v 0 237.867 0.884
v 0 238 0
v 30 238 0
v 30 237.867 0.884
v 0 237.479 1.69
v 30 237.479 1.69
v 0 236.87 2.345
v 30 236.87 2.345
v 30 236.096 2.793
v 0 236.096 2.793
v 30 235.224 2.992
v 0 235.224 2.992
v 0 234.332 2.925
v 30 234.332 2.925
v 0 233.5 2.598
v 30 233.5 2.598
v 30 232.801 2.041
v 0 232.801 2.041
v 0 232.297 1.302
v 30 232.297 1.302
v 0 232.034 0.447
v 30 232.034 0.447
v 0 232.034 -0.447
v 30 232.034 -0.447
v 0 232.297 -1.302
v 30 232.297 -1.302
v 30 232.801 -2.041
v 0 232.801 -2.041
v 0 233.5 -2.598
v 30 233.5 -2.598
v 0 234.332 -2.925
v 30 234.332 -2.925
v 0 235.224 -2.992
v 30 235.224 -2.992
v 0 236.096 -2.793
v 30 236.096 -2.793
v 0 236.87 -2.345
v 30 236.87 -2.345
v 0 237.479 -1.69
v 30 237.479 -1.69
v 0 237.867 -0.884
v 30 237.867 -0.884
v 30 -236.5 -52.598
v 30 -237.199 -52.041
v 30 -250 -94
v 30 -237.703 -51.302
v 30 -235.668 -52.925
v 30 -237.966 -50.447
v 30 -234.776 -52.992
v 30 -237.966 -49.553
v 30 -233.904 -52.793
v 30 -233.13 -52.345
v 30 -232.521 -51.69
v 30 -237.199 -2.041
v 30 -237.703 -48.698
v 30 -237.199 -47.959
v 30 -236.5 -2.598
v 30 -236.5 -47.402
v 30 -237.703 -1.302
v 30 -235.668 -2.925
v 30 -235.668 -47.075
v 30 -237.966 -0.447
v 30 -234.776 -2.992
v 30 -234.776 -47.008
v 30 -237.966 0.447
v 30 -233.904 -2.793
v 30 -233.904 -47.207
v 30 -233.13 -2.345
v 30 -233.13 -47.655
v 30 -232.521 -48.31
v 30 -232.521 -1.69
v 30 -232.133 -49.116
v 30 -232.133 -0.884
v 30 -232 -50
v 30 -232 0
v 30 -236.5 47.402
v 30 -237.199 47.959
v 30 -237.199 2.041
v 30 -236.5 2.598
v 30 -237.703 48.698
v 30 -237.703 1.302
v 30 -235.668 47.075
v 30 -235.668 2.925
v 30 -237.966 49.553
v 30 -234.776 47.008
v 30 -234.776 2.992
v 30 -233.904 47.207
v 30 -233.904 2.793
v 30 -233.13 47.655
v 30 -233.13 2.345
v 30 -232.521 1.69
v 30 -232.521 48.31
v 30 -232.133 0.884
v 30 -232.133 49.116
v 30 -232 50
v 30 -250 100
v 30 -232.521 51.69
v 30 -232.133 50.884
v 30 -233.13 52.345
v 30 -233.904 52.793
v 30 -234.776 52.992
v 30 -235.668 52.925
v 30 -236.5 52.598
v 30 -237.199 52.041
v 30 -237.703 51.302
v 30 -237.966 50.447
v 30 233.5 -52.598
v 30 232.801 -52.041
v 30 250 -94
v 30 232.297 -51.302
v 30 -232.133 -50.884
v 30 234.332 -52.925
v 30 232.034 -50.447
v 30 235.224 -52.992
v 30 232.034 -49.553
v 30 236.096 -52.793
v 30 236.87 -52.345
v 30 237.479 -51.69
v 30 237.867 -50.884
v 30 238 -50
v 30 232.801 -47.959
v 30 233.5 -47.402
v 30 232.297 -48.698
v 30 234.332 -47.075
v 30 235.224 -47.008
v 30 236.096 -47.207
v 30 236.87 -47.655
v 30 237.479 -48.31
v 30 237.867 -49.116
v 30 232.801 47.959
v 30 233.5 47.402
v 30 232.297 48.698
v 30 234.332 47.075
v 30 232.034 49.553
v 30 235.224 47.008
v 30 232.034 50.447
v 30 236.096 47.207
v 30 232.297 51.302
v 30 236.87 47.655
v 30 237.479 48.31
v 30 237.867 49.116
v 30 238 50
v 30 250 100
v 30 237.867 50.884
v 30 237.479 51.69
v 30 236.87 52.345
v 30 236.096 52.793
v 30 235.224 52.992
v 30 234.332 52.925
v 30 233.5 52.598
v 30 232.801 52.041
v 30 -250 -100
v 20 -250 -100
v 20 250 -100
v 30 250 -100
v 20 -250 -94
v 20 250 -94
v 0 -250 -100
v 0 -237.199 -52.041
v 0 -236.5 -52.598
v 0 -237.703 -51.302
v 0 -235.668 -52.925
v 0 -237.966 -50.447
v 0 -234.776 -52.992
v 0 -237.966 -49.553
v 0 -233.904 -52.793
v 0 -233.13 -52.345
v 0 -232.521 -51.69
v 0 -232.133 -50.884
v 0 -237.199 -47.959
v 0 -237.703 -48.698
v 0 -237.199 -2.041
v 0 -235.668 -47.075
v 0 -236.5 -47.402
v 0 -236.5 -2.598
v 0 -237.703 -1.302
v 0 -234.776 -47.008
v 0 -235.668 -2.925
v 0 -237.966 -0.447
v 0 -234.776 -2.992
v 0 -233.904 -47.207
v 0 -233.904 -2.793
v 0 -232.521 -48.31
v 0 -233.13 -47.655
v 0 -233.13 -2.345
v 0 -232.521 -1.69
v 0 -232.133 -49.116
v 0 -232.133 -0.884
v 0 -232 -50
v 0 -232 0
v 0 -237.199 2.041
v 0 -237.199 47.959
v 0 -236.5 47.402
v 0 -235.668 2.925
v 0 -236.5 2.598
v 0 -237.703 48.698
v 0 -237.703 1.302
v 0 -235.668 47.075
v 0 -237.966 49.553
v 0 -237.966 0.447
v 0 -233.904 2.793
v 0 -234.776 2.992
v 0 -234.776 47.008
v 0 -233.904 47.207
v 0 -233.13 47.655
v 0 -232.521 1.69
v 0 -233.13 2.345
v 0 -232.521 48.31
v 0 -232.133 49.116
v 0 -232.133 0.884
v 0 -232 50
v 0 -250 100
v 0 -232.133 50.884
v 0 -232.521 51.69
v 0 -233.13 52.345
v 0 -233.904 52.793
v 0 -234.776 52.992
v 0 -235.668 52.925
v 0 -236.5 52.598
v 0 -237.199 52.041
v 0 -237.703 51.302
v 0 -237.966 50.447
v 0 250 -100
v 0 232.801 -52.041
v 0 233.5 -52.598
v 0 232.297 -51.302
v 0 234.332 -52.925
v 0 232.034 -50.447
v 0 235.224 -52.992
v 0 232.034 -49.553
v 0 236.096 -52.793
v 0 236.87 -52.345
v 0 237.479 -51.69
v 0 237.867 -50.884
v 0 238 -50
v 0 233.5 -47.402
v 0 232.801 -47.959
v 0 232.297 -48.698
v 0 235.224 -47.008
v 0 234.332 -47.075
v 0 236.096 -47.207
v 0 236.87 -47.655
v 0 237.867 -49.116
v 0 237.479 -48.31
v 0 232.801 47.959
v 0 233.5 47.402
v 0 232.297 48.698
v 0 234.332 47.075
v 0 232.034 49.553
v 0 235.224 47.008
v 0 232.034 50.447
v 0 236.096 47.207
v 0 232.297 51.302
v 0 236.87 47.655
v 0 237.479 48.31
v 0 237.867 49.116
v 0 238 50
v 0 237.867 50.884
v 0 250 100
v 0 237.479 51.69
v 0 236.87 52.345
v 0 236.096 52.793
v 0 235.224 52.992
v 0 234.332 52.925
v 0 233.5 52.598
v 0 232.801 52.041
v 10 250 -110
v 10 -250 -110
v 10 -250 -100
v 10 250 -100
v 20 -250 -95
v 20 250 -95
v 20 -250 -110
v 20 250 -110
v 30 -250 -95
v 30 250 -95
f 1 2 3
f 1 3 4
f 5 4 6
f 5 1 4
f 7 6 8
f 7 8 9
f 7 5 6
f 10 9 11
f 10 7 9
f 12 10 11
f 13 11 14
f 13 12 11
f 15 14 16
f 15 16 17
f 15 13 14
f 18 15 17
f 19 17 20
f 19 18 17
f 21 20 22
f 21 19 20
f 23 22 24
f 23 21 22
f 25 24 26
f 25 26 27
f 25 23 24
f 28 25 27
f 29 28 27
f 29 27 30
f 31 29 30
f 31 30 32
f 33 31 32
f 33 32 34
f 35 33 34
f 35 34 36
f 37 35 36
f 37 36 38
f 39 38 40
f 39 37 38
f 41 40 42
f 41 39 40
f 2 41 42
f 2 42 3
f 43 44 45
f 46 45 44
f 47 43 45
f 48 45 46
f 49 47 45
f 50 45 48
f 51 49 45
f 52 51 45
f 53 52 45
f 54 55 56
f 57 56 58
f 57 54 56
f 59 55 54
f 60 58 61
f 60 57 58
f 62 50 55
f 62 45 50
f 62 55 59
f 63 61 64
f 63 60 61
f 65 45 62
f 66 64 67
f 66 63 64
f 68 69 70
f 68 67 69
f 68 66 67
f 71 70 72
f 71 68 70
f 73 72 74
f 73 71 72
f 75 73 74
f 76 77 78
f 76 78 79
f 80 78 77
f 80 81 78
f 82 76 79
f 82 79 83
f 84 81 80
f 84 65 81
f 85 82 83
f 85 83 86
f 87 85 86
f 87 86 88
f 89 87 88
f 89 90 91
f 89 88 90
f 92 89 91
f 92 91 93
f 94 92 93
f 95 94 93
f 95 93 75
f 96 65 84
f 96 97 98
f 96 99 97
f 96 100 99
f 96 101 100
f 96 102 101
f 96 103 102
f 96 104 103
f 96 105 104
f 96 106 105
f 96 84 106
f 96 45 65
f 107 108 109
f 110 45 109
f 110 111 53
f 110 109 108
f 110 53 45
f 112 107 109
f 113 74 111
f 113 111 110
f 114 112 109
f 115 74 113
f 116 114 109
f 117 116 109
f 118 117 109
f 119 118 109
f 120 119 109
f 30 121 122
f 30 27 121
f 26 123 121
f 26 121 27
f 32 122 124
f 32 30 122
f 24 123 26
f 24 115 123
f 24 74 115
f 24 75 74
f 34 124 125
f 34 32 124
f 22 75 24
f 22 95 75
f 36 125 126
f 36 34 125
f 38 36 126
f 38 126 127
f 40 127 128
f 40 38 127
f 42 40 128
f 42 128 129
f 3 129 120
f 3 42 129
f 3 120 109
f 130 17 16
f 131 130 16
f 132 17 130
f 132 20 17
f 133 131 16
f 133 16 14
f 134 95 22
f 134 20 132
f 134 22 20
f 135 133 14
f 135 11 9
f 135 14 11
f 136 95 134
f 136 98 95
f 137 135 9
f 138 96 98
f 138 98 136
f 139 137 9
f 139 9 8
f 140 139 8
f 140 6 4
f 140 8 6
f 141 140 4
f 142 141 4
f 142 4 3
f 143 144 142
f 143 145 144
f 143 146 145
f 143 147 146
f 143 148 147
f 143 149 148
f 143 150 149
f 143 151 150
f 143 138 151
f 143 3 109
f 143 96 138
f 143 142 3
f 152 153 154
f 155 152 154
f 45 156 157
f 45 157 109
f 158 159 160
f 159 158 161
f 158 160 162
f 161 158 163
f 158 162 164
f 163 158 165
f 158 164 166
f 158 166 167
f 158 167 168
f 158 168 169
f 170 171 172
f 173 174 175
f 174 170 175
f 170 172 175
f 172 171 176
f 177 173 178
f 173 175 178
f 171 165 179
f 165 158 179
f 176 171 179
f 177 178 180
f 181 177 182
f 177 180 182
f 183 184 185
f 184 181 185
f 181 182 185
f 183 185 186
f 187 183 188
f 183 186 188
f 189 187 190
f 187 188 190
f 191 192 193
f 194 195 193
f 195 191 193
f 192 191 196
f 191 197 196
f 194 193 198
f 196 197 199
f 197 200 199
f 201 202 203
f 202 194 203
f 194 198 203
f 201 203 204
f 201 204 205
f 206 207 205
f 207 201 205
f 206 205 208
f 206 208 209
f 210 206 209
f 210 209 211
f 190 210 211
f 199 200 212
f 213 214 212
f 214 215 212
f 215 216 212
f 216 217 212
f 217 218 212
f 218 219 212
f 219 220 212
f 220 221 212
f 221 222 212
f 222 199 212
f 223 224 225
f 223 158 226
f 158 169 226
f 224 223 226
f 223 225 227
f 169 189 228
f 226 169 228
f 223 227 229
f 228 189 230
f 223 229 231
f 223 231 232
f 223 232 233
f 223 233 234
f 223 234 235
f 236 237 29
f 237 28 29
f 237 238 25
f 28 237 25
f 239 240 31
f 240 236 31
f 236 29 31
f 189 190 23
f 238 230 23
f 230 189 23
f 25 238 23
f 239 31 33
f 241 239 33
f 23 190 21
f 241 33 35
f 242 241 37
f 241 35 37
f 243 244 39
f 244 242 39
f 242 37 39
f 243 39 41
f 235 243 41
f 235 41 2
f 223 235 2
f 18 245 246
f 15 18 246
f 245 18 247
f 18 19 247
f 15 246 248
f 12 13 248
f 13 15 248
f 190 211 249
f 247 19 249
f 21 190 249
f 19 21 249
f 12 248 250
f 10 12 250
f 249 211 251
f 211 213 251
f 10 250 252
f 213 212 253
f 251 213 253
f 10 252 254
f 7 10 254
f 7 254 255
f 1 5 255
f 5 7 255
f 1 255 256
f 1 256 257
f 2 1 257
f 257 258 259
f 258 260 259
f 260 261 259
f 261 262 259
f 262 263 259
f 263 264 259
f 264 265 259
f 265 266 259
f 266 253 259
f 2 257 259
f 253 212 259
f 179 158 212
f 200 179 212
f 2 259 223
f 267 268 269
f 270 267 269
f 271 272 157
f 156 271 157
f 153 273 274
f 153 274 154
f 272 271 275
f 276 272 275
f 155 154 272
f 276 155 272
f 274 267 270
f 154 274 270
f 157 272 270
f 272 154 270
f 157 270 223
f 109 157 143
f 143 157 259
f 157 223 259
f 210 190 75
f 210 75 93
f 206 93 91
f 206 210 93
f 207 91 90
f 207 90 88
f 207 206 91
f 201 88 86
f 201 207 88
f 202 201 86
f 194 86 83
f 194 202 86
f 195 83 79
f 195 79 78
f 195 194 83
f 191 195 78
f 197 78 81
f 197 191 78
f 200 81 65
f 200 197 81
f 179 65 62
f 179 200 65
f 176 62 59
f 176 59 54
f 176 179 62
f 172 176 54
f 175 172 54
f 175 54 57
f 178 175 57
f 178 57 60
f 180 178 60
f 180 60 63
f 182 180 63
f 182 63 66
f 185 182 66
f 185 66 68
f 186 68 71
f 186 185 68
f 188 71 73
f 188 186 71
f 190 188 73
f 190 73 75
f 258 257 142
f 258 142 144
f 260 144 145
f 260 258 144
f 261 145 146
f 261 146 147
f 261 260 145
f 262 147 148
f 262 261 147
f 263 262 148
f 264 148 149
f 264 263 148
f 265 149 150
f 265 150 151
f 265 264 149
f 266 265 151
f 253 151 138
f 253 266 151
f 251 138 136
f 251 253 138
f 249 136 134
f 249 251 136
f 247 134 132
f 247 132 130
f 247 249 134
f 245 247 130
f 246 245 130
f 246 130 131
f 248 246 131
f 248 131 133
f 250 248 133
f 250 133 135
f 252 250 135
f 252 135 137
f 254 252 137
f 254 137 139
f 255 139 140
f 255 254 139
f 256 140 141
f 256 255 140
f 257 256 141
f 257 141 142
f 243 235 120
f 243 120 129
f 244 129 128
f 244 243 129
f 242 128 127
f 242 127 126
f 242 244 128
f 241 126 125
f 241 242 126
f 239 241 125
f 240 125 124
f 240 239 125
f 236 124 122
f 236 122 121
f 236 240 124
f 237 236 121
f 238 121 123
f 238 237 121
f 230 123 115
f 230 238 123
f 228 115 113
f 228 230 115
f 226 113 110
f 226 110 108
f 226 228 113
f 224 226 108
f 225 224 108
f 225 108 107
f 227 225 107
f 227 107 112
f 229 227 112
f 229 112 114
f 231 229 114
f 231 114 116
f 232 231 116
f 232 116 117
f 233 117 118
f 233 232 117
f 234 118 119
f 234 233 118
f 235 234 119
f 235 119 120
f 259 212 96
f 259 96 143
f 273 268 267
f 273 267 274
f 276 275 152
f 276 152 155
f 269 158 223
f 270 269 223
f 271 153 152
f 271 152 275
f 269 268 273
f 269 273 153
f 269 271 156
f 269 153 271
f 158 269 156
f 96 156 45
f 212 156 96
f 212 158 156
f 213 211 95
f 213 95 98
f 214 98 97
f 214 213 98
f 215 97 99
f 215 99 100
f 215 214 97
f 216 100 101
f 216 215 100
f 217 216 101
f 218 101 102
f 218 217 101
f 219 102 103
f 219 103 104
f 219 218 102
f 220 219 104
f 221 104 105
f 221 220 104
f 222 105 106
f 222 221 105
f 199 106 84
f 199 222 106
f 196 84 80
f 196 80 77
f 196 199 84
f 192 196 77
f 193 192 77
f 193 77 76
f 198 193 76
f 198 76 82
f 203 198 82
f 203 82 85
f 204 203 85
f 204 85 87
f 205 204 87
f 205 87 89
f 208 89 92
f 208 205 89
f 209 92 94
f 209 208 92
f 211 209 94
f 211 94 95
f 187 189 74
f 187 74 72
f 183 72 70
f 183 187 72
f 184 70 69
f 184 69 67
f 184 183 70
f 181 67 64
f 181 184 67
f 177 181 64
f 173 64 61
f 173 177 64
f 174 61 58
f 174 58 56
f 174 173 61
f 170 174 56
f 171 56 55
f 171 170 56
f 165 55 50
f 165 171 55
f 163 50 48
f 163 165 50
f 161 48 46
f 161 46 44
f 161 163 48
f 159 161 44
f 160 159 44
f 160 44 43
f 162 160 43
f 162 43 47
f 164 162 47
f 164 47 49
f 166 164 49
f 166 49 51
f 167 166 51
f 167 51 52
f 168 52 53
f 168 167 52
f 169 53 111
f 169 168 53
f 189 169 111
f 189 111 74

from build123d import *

# Parameters (mm, degrees)
F0_W     = 500
F0_H     = 200
F0_R     = 3
F1_DEPTH = 30
F2_W     = 10
F2_H     = 10
F3_DEPTH = 500
F4_W     = 10
F4_H     = 1
F5_DEPTH = 500


with BuildPart() as f1:
    # F0 (on Right) → F1 (new body)
    with BuildSketch(Plane.YZ):
        Rectangle(F0_W, F0_H)
        with Locations((-235, -50)):
            Circle(F0_R, mode=Mode.SUBTRACT)
        with Locations((235, -50)):
            Circle(F0_R, mode=Mode.SUBTRACT)
        with Locations((-235, 0)):
            Circle(F0_R, mode=Mode.SUBTRACT)
        with Locations((-235, 50)):
            Circle(F0_R, mode=Mode.SUBTRACT)
        with Locations((235, 0)):
            Circle(F0_R, mode=Mode.SUBTRACT)
        with Locations((235, 50)):
            Circle(F0_R, mode=Mode.SUBTRACT)
    extrude(amount=F1_DEPTH)

    # F2 (on face) → F3 (join)
    with BuildSketch(Plane.XZ.offset(250)):
        with Locations((15, -105)):
            Rectangle(F2_W, F2_H)
    extrude(amount=-F3_DEPTH)

    # F4 (on face) → F5 (cut)
    with BuildSketch(Plane.XZ.offset(250)):
        with Locations((25, -94.5)):
            Rectangle(F4_W, F4_H)
    extrude(amount=-F5_DEPTH, mode=Mode.SUBTRACT)


solid = f1.part
